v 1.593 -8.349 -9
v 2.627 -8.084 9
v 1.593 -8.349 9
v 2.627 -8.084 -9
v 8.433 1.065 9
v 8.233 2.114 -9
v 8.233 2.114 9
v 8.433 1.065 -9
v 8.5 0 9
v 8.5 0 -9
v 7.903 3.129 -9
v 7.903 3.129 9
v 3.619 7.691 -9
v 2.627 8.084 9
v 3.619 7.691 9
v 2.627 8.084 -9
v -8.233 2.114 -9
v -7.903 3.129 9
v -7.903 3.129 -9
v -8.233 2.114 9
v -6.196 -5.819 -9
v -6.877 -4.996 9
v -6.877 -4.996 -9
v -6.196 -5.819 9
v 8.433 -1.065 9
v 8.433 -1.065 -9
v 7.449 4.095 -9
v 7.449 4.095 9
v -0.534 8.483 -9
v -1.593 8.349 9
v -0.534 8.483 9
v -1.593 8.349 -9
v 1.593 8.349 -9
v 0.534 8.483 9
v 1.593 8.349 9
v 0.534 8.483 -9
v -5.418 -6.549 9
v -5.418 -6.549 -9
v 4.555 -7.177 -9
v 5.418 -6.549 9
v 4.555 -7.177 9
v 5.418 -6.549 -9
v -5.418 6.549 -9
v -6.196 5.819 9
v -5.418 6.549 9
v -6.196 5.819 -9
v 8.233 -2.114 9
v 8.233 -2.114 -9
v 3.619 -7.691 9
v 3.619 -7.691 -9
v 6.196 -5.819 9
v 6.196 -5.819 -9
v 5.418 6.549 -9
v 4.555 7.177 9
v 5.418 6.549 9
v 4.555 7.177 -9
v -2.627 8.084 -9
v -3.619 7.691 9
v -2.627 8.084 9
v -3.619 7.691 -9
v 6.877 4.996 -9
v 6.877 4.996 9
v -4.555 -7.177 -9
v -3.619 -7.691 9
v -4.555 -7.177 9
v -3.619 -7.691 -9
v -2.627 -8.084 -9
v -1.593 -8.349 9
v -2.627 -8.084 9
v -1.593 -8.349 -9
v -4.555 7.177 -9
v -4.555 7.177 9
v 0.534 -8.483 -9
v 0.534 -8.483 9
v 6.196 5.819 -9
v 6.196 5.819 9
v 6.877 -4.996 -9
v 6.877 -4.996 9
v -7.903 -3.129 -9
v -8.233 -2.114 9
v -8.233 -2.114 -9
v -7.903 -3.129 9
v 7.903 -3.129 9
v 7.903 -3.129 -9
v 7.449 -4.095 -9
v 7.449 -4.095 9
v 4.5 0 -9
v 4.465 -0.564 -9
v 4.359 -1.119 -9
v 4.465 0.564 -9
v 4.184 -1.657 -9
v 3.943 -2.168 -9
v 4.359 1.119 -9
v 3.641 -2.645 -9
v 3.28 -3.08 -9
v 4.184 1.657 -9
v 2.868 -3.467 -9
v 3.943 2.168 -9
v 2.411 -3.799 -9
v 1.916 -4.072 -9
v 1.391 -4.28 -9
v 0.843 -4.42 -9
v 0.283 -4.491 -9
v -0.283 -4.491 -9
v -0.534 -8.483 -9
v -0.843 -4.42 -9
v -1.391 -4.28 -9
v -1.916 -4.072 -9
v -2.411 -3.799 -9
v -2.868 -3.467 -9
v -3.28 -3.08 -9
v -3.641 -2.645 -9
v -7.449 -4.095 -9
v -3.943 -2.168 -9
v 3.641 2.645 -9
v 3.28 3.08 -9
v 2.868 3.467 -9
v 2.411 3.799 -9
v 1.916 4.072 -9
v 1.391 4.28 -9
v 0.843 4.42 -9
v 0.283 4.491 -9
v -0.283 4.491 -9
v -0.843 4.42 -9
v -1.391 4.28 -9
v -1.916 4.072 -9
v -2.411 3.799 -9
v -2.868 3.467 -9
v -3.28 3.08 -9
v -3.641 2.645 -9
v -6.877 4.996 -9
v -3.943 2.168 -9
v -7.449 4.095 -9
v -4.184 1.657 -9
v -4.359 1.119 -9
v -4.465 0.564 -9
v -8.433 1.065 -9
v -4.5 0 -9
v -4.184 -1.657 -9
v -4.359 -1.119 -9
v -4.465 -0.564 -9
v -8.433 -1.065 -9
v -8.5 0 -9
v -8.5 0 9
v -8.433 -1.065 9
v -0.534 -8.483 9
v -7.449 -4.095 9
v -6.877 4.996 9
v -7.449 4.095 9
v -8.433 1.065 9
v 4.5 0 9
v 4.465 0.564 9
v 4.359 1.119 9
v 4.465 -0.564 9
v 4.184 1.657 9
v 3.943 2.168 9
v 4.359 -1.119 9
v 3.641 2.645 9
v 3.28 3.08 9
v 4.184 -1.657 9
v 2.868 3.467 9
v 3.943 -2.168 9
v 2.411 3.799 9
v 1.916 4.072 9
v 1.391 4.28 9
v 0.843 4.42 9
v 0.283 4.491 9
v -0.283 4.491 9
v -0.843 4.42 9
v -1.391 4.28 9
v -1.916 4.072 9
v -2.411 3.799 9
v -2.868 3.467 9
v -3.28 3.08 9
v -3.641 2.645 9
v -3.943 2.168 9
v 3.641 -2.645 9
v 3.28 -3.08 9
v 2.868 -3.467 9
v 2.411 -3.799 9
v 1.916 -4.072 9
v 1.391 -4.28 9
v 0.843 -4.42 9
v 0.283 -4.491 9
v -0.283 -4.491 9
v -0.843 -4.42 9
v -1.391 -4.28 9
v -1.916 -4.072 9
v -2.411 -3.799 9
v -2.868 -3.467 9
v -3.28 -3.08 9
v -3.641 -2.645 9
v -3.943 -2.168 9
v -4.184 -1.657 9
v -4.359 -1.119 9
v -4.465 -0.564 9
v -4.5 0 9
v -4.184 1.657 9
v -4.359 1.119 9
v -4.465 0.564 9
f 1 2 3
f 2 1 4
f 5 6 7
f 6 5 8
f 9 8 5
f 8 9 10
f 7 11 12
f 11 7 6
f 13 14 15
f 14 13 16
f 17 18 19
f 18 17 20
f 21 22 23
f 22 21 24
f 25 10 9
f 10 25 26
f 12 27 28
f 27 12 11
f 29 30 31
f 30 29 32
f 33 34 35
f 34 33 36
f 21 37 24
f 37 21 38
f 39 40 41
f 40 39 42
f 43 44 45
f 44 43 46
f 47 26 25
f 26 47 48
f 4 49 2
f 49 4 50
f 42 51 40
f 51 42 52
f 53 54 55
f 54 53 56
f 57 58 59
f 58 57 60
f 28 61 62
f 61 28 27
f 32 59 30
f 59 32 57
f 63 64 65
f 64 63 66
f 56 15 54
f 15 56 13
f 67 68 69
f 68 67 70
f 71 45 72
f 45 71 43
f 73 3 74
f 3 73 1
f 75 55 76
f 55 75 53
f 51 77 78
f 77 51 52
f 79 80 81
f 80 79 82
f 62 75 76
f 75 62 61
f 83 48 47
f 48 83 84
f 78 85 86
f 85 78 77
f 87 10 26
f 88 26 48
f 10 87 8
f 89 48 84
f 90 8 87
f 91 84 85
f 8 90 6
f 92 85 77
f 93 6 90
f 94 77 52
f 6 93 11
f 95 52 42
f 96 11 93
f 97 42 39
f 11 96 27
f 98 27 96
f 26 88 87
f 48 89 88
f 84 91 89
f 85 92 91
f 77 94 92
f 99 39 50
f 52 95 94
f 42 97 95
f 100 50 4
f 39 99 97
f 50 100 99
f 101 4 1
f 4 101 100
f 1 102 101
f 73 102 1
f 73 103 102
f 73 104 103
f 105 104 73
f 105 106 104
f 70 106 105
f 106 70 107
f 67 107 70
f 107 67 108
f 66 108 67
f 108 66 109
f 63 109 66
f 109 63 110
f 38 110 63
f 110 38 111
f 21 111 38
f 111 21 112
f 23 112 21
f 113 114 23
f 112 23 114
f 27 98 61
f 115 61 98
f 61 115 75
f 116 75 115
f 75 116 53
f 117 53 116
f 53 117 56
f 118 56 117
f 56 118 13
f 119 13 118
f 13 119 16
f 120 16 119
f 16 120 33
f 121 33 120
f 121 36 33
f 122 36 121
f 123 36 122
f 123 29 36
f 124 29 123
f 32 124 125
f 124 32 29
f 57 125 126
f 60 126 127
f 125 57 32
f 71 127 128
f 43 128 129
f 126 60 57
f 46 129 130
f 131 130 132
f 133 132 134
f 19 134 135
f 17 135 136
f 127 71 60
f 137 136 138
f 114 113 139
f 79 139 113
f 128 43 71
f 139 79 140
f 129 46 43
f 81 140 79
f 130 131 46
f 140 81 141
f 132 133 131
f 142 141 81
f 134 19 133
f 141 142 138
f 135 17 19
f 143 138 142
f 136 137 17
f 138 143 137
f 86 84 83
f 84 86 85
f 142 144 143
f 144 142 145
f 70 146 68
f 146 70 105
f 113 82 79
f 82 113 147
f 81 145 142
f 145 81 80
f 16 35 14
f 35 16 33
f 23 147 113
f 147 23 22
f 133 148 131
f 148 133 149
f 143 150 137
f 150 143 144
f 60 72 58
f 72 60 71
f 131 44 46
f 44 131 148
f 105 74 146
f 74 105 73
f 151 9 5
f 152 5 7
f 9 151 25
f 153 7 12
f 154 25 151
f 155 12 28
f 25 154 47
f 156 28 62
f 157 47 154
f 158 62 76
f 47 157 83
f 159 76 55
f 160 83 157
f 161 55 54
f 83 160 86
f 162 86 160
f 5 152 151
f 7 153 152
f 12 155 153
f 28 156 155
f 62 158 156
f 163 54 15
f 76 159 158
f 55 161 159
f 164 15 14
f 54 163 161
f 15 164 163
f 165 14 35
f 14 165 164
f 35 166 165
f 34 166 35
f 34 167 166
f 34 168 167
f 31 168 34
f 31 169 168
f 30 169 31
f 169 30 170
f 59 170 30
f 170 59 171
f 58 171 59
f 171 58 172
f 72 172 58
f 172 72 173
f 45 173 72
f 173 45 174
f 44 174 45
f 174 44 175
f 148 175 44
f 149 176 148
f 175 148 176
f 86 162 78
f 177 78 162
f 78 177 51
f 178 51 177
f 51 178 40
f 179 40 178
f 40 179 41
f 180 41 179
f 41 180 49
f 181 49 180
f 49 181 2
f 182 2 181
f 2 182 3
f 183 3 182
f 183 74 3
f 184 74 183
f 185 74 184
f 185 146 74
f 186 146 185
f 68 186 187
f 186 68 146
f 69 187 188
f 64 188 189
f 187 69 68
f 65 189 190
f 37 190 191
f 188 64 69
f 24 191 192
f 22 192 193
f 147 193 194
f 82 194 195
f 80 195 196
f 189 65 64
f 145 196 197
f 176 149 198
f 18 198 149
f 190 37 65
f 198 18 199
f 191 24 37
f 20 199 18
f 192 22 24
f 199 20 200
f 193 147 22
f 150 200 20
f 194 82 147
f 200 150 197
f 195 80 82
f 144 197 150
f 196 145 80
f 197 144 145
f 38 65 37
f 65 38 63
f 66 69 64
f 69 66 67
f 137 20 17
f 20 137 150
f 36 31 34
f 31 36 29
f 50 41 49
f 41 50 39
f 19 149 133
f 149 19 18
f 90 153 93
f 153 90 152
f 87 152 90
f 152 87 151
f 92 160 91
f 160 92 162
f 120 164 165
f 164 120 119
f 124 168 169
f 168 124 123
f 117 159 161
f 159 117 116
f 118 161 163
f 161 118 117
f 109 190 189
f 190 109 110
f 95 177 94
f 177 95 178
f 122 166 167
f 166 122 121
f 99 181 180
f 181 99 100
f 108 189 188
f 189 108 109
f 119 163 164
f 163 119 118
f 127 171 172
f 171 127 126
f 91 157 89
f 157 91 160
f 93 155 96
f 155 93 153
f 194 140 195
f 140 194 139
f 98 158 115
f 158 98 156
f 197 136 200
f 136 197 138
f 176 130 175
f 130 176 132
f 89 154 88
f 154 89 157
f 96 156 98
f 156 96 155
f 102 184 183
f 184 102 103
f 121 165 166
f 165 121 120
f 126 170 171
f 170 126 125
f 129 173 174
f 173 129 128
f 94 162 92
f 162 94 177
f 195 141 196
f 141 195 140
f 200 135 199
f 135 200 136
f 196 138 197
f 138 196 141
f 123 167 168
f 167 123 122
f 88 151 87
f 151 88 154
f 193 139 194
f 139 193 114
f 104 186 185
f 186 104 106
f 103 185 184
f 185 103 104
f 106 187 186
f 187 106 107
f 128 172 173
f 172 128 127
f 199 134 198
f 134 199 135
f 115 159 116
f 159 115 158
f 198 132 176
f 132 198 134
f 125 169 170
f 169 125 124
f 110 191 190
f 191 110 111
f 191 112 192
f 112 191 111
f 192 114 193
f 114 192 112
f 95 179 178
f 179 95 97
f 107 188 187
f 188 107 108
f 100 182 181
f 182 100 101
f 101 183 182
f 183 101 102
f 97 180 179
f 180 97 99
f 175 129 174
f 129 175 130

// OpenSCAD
$fn = 50;


difference() {
	union() {
		translate(v = [0, 0, -9.0000000000]) {
			cylinder(h = 18, r = 8.5000000000);
		}
	}
	union() {
		translate(v = [0, 0, -100.0000000000]) {
			cylinder(h = 200, r = 4.5000000000);
		}
	}
}
